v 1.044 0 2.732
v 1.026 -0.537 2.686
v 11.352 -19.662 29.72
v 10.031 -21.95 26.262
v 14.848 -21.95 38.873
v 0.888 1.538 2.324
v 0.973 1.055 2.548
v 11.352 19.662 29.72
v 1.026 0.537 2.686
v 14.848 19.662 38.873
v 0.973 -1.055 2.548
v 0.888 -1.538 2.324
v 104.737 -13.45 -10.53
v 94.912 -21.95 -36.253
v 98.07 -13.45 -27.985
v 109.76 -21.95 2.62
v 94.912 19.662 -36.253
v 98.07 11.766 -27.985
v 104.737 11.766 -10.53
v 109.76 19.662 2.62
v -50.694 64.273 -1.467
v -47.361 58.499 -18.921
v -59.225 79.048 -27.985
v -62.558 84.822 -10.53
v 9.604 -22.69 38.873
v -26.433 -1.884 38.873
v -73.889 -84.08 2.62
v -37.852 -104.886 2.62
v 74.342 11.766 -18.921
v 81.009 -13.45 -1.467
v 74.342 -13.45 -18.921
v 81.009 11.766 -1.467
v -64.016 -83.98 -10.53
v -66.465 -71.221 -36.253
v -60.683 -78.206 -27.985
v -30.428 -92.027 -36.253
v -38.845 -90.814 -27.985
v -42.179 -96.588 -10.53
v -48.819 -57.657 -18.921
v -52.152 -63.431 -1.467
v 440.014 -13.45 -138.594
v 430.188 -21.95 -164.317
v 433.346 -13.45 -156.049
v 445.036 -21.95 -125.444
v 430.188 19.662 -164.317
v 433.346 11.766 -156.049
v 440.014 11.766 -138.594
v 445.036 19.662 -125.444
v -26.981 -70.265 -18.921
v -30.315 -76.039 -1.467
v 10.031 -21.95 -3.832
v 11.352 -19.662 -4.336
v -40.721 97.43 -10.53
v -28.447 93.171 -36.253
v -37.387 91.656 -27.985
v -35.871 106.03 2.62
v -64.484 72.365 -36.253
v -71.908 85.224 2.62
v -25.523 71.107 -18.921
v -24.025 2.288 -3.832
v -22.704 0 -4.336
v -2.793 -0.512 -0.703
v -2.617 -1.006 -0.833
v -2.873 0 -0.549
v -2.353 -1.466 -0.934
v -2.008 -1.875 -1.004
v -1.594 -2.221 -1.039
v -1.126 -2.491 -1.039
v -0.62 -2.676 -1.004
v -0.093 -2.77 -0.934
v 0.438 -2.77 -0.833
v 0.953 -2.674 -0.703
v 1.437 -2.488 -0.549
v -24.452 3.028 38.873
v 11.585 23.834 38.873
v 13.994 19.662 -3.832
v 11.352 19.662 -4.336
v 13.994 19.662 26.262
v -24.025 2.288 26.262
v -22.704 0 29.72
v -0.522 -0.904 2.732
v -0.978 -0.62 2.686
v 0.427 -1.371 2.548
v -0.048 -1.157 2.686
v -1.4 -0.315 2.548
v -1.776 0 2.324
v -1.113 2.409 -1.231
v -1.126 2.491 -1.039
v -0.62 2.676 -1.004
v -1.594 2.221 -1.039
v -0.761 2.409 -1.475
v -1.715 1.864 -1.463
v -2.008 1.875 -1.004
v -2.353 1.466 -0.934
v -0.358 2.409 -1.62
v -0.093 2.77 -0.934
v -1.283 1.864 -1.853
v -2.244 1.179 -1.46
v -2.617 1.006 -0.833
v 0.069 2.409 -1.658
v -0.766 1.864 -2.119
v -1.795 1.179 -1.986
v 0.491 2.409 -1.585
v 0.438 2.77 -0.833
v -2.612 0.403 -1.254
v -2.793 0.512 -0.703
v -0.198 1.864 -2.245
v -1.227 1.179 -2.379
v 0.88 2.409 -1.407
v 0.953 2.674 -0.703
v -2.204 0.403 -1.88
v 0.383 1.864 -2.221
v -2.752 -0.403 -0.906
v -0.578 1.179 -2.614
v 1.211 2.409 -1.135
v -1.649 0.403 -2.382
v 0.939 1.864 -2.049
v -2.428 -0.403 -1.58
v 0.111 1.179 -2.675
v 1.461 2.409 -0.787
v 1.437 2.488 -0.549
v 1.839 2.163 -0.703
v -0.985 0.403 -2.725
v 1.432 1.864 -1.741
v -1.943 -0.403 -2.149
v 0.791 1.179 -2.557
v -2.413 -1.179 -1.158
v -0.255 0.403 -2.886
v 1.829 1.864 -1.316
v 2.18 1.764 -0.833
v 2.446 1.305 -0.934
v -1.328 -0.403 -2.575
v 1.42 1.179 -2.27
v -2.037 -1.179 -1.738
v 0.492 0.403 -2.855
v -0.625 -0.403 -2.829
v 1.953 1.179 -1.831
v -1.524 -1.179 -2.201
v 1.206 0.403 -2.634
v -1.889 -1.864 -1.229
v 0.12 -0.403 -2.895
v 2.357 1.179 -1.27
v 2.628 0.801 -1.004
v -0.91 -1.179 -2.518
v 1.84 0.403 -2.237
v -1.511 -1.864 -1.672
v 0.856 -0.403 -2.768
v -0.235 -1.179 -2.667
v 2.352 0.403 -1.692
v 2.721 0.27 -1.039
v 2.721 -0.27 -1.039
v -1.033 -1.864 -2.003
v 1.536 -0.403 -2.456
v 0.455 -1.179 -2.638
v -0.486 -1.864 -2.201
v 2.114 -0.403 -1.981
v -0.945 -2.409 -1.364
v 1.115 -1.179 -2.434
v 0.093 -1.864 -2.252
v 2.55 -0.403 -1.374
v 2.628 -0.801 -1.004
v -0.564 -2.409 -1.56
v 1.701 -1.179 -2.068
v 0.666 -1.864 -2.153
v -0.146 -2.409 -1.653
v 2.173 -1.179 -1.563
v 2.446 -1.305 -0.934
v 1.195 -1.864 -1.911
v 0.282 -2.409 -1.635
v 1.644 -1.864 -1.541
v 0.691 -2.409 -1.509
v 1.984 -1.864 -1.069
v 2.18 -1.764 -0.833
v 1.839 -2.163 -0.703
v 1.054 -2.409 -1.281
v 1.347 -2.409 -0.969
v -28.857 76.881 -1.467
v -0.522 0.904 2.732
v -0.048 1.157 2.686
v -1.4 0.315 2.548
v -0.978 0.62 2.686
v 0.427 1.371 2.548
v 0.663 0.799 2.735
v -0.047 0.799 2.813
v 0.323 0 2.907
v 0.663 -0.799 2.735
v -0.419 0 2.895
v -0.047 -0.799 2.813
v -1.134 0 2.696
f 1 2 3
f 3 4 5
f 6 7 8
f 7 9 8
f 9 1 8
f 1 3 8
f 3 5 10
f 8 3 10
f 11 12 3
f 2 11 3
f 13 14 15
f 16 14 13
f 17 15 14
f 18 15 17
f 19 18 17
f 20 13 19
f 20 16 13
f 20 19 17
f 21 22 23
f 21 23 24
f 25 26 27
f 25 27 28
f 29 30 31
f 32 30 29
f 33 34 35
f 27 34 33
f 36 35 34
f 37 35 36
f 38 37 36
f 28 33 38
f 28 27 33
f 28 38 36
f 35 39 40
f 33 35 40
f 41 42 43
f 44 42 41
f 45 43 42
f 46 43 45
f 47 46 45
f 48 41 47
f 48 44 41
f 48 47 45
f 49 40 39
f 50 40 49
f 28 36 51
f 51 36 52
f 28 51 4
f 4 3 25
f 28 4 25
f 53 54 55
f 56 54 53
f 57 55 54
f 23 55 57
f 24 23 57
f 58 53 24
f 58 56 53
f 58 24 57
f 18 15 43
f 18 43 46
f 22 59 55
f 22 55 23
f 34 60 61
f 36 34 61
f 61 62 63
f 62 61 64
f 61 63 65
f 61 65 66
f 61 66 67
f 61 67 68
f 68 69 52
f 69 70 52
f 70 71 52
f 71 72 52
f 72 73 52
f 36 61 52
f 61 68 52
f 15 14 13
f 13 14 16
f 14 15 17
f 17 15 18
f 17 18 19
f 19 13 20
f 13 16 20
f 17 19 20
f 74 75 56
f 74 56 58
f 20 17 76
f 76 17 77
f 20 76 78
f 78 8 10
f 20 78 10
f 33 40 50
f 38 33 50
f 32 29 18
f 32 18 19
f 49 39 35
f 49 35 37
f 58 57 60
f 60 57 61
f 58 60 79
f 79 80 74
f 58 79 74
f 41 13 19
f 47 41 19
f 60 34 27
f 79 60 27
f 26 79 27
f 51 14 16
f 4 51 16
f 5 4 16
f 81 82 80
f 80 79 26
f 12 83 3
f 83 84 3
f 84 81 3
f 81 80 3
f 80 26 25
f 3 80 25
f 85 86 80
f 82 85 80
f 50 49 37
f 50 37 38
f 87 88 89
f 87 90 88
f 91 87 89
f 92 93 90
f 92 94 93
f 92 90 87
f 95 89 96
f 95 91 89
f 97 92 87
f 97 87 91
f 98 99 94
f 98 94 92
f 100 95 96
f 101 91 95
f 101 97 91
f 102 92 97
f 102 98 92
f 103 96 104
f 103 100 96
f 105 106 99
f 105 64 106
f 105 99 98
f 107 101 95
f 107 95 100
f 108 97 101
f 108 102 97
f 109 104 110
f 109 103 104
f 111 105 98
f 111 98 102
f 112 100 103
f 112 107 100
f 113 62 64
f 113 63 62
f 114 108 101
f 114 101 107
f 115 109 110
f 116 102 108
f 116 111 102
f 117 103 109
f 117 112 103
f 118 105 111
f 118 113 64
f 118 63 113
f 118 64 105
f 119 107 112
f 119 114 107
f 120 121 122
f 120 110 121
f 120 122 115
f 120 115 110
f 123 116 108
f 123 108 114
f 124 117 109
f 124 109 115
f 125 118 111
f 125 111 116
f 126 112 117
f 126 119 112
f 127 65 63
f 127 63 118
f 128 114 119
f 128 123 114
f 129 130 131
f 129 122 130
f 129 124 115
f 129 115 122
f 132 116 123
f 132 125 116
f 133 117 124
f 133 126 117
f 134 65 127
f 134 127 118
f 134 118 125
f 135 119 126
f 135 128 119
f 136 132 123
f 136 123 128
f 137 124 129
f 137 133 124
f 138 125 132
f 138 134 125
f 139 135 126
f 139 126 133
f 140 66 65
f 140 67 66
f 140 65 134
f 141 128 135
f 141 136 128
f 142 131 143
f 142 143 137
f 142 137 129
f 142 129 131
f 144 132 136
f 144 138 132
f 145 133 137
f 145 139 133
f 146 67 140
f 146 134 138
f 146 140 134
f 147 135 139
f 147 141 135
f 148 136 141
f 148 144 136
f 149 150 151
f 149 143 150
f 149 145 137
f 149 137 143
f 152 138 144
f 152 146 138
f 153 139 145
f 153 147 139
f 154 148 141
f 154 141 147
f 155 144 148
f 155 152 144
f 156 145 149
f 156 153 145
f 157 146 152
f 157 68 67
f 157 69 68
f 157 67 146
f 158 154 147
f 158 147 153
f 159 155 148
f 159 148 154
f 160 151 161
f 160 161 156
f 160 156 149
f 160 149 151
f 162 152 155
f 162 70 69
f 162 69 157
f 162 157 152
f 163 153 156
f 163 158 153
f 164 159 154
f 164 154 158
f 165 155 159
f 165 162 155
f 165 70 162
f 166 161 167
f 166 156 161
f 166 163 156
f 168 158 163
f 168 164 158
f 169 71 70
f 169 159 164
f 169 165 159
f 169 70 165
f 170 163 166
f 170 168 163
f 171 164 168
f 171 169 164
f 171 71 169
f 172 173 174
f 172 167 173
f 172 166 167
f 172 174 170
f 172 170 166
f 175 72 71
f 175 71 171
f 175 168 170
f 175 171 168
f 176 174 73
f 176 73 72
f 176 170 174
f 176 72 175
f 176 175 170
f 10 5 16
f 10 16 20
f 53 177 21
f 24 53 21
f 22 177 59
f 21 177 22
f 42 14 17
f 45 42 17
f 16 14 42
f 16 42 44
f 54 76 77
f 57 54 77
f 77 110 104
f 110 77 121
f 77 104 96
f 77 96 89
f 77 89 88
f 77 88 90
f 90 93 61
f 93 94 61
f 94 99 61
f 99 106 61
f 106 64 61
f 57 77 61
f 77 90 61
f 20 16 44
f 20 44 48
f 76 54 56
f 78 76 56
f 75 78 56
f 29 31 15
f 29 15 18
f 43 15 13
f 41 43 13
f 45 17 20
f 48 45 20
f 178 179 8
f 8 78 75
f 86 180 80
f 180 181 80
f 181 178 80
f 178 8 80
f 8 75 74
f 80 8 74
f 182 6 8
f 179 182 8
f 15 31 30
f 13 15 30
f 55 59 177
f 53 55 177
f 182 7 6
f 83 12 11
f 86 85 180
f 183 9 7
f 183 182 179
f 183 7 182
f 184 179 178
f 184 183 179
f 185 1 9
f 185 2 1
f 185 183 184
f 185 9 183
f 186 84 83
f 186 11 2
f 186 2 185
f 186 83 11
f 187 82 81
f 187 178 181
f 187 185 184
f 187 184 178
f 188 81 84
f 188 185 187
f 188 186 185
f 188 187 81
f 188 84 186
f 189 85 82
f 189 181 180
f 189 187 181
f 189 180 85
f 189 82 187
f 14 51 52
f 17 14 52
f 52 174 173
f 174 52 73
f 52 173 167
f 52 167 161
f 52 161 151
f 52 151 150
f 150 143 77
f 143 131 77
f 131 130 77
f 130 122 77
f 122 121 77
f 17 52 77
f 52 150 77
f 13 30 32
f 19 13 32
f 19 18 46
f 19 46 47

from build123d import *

# Parameters (mm, degrees)
F0_W     = 41.6124016047
F0_H     = 41.6124016047
F1_DEPTH = 101.6
F2_W     = 25.2156527713
F2_H     = 18.6845967546
F3_DEPTH = 25.4
F4_ANGLE = -20.9051575
F8_COUNT = 3
F9_DEPTH = 358.902


with BuildPart() as f1:
    # F0 (on Right) → F1 (new body)
    with BuildSketch(Plane.YZ):
        with Locations((-1.1438857764, 20.8062008023)):
            Rectangle(F0_W, F0_H)
    extrude(amount=F1_DEPTH)

    # F2 (on face) → F3 (cut)
    with BuildSketch(Plane.YZ.offset(101.6)):
        with Locations((-0.8418601938, 18.1932910345)):
            Rectangle(F2_W, F2_H)
    extrude(amount=-F3_DEPTH, mode=Mode.SUBTRACT)


with BuildPart() as f1_1:
    # F4: moved
    add(f1.part.rotate(Axis((0, -1.1438857764, 0), (0, -1, 0)), F4_ANGLE))

    # F6 (on Top) → F7 (revolve)
    with BuildSketch(Plane.XY):
        with BuildLine():
            Line((0, -2.9249929607), (0, 2.9249929607))
            ThreePointArc((0, 2.9249929607), (-2.9249929607, 0), (0, -2.9249929607))
        make_face()
    revolve(axis=Axis((0, 0, 0), (0, -1, 0)))

    # F8: F1 ×3 about axis
    f8_axis = Axis((0, 0, 36.8781723082), (0, 0, 1))


with BuildPart() as f1_2:
    add(f1_1.part)
    for i in range(1, F8_COUNT):
        add(f1_1.part.rotate(f8_axis, i * 360 / F8_COUNT))


with BuildPart() as f9:
    # F9 (new): a face of the model
    f9_faces = [f1_2.part.faces().sort_by_distance(p)[0] for p in [
        (102.3360237058, -21.3615983516, -16.8165467295),
    ]]
    extrude(f9_faces, amount=F9_DEPTH)


solid = Compound([f1_2.part, f9.part])
